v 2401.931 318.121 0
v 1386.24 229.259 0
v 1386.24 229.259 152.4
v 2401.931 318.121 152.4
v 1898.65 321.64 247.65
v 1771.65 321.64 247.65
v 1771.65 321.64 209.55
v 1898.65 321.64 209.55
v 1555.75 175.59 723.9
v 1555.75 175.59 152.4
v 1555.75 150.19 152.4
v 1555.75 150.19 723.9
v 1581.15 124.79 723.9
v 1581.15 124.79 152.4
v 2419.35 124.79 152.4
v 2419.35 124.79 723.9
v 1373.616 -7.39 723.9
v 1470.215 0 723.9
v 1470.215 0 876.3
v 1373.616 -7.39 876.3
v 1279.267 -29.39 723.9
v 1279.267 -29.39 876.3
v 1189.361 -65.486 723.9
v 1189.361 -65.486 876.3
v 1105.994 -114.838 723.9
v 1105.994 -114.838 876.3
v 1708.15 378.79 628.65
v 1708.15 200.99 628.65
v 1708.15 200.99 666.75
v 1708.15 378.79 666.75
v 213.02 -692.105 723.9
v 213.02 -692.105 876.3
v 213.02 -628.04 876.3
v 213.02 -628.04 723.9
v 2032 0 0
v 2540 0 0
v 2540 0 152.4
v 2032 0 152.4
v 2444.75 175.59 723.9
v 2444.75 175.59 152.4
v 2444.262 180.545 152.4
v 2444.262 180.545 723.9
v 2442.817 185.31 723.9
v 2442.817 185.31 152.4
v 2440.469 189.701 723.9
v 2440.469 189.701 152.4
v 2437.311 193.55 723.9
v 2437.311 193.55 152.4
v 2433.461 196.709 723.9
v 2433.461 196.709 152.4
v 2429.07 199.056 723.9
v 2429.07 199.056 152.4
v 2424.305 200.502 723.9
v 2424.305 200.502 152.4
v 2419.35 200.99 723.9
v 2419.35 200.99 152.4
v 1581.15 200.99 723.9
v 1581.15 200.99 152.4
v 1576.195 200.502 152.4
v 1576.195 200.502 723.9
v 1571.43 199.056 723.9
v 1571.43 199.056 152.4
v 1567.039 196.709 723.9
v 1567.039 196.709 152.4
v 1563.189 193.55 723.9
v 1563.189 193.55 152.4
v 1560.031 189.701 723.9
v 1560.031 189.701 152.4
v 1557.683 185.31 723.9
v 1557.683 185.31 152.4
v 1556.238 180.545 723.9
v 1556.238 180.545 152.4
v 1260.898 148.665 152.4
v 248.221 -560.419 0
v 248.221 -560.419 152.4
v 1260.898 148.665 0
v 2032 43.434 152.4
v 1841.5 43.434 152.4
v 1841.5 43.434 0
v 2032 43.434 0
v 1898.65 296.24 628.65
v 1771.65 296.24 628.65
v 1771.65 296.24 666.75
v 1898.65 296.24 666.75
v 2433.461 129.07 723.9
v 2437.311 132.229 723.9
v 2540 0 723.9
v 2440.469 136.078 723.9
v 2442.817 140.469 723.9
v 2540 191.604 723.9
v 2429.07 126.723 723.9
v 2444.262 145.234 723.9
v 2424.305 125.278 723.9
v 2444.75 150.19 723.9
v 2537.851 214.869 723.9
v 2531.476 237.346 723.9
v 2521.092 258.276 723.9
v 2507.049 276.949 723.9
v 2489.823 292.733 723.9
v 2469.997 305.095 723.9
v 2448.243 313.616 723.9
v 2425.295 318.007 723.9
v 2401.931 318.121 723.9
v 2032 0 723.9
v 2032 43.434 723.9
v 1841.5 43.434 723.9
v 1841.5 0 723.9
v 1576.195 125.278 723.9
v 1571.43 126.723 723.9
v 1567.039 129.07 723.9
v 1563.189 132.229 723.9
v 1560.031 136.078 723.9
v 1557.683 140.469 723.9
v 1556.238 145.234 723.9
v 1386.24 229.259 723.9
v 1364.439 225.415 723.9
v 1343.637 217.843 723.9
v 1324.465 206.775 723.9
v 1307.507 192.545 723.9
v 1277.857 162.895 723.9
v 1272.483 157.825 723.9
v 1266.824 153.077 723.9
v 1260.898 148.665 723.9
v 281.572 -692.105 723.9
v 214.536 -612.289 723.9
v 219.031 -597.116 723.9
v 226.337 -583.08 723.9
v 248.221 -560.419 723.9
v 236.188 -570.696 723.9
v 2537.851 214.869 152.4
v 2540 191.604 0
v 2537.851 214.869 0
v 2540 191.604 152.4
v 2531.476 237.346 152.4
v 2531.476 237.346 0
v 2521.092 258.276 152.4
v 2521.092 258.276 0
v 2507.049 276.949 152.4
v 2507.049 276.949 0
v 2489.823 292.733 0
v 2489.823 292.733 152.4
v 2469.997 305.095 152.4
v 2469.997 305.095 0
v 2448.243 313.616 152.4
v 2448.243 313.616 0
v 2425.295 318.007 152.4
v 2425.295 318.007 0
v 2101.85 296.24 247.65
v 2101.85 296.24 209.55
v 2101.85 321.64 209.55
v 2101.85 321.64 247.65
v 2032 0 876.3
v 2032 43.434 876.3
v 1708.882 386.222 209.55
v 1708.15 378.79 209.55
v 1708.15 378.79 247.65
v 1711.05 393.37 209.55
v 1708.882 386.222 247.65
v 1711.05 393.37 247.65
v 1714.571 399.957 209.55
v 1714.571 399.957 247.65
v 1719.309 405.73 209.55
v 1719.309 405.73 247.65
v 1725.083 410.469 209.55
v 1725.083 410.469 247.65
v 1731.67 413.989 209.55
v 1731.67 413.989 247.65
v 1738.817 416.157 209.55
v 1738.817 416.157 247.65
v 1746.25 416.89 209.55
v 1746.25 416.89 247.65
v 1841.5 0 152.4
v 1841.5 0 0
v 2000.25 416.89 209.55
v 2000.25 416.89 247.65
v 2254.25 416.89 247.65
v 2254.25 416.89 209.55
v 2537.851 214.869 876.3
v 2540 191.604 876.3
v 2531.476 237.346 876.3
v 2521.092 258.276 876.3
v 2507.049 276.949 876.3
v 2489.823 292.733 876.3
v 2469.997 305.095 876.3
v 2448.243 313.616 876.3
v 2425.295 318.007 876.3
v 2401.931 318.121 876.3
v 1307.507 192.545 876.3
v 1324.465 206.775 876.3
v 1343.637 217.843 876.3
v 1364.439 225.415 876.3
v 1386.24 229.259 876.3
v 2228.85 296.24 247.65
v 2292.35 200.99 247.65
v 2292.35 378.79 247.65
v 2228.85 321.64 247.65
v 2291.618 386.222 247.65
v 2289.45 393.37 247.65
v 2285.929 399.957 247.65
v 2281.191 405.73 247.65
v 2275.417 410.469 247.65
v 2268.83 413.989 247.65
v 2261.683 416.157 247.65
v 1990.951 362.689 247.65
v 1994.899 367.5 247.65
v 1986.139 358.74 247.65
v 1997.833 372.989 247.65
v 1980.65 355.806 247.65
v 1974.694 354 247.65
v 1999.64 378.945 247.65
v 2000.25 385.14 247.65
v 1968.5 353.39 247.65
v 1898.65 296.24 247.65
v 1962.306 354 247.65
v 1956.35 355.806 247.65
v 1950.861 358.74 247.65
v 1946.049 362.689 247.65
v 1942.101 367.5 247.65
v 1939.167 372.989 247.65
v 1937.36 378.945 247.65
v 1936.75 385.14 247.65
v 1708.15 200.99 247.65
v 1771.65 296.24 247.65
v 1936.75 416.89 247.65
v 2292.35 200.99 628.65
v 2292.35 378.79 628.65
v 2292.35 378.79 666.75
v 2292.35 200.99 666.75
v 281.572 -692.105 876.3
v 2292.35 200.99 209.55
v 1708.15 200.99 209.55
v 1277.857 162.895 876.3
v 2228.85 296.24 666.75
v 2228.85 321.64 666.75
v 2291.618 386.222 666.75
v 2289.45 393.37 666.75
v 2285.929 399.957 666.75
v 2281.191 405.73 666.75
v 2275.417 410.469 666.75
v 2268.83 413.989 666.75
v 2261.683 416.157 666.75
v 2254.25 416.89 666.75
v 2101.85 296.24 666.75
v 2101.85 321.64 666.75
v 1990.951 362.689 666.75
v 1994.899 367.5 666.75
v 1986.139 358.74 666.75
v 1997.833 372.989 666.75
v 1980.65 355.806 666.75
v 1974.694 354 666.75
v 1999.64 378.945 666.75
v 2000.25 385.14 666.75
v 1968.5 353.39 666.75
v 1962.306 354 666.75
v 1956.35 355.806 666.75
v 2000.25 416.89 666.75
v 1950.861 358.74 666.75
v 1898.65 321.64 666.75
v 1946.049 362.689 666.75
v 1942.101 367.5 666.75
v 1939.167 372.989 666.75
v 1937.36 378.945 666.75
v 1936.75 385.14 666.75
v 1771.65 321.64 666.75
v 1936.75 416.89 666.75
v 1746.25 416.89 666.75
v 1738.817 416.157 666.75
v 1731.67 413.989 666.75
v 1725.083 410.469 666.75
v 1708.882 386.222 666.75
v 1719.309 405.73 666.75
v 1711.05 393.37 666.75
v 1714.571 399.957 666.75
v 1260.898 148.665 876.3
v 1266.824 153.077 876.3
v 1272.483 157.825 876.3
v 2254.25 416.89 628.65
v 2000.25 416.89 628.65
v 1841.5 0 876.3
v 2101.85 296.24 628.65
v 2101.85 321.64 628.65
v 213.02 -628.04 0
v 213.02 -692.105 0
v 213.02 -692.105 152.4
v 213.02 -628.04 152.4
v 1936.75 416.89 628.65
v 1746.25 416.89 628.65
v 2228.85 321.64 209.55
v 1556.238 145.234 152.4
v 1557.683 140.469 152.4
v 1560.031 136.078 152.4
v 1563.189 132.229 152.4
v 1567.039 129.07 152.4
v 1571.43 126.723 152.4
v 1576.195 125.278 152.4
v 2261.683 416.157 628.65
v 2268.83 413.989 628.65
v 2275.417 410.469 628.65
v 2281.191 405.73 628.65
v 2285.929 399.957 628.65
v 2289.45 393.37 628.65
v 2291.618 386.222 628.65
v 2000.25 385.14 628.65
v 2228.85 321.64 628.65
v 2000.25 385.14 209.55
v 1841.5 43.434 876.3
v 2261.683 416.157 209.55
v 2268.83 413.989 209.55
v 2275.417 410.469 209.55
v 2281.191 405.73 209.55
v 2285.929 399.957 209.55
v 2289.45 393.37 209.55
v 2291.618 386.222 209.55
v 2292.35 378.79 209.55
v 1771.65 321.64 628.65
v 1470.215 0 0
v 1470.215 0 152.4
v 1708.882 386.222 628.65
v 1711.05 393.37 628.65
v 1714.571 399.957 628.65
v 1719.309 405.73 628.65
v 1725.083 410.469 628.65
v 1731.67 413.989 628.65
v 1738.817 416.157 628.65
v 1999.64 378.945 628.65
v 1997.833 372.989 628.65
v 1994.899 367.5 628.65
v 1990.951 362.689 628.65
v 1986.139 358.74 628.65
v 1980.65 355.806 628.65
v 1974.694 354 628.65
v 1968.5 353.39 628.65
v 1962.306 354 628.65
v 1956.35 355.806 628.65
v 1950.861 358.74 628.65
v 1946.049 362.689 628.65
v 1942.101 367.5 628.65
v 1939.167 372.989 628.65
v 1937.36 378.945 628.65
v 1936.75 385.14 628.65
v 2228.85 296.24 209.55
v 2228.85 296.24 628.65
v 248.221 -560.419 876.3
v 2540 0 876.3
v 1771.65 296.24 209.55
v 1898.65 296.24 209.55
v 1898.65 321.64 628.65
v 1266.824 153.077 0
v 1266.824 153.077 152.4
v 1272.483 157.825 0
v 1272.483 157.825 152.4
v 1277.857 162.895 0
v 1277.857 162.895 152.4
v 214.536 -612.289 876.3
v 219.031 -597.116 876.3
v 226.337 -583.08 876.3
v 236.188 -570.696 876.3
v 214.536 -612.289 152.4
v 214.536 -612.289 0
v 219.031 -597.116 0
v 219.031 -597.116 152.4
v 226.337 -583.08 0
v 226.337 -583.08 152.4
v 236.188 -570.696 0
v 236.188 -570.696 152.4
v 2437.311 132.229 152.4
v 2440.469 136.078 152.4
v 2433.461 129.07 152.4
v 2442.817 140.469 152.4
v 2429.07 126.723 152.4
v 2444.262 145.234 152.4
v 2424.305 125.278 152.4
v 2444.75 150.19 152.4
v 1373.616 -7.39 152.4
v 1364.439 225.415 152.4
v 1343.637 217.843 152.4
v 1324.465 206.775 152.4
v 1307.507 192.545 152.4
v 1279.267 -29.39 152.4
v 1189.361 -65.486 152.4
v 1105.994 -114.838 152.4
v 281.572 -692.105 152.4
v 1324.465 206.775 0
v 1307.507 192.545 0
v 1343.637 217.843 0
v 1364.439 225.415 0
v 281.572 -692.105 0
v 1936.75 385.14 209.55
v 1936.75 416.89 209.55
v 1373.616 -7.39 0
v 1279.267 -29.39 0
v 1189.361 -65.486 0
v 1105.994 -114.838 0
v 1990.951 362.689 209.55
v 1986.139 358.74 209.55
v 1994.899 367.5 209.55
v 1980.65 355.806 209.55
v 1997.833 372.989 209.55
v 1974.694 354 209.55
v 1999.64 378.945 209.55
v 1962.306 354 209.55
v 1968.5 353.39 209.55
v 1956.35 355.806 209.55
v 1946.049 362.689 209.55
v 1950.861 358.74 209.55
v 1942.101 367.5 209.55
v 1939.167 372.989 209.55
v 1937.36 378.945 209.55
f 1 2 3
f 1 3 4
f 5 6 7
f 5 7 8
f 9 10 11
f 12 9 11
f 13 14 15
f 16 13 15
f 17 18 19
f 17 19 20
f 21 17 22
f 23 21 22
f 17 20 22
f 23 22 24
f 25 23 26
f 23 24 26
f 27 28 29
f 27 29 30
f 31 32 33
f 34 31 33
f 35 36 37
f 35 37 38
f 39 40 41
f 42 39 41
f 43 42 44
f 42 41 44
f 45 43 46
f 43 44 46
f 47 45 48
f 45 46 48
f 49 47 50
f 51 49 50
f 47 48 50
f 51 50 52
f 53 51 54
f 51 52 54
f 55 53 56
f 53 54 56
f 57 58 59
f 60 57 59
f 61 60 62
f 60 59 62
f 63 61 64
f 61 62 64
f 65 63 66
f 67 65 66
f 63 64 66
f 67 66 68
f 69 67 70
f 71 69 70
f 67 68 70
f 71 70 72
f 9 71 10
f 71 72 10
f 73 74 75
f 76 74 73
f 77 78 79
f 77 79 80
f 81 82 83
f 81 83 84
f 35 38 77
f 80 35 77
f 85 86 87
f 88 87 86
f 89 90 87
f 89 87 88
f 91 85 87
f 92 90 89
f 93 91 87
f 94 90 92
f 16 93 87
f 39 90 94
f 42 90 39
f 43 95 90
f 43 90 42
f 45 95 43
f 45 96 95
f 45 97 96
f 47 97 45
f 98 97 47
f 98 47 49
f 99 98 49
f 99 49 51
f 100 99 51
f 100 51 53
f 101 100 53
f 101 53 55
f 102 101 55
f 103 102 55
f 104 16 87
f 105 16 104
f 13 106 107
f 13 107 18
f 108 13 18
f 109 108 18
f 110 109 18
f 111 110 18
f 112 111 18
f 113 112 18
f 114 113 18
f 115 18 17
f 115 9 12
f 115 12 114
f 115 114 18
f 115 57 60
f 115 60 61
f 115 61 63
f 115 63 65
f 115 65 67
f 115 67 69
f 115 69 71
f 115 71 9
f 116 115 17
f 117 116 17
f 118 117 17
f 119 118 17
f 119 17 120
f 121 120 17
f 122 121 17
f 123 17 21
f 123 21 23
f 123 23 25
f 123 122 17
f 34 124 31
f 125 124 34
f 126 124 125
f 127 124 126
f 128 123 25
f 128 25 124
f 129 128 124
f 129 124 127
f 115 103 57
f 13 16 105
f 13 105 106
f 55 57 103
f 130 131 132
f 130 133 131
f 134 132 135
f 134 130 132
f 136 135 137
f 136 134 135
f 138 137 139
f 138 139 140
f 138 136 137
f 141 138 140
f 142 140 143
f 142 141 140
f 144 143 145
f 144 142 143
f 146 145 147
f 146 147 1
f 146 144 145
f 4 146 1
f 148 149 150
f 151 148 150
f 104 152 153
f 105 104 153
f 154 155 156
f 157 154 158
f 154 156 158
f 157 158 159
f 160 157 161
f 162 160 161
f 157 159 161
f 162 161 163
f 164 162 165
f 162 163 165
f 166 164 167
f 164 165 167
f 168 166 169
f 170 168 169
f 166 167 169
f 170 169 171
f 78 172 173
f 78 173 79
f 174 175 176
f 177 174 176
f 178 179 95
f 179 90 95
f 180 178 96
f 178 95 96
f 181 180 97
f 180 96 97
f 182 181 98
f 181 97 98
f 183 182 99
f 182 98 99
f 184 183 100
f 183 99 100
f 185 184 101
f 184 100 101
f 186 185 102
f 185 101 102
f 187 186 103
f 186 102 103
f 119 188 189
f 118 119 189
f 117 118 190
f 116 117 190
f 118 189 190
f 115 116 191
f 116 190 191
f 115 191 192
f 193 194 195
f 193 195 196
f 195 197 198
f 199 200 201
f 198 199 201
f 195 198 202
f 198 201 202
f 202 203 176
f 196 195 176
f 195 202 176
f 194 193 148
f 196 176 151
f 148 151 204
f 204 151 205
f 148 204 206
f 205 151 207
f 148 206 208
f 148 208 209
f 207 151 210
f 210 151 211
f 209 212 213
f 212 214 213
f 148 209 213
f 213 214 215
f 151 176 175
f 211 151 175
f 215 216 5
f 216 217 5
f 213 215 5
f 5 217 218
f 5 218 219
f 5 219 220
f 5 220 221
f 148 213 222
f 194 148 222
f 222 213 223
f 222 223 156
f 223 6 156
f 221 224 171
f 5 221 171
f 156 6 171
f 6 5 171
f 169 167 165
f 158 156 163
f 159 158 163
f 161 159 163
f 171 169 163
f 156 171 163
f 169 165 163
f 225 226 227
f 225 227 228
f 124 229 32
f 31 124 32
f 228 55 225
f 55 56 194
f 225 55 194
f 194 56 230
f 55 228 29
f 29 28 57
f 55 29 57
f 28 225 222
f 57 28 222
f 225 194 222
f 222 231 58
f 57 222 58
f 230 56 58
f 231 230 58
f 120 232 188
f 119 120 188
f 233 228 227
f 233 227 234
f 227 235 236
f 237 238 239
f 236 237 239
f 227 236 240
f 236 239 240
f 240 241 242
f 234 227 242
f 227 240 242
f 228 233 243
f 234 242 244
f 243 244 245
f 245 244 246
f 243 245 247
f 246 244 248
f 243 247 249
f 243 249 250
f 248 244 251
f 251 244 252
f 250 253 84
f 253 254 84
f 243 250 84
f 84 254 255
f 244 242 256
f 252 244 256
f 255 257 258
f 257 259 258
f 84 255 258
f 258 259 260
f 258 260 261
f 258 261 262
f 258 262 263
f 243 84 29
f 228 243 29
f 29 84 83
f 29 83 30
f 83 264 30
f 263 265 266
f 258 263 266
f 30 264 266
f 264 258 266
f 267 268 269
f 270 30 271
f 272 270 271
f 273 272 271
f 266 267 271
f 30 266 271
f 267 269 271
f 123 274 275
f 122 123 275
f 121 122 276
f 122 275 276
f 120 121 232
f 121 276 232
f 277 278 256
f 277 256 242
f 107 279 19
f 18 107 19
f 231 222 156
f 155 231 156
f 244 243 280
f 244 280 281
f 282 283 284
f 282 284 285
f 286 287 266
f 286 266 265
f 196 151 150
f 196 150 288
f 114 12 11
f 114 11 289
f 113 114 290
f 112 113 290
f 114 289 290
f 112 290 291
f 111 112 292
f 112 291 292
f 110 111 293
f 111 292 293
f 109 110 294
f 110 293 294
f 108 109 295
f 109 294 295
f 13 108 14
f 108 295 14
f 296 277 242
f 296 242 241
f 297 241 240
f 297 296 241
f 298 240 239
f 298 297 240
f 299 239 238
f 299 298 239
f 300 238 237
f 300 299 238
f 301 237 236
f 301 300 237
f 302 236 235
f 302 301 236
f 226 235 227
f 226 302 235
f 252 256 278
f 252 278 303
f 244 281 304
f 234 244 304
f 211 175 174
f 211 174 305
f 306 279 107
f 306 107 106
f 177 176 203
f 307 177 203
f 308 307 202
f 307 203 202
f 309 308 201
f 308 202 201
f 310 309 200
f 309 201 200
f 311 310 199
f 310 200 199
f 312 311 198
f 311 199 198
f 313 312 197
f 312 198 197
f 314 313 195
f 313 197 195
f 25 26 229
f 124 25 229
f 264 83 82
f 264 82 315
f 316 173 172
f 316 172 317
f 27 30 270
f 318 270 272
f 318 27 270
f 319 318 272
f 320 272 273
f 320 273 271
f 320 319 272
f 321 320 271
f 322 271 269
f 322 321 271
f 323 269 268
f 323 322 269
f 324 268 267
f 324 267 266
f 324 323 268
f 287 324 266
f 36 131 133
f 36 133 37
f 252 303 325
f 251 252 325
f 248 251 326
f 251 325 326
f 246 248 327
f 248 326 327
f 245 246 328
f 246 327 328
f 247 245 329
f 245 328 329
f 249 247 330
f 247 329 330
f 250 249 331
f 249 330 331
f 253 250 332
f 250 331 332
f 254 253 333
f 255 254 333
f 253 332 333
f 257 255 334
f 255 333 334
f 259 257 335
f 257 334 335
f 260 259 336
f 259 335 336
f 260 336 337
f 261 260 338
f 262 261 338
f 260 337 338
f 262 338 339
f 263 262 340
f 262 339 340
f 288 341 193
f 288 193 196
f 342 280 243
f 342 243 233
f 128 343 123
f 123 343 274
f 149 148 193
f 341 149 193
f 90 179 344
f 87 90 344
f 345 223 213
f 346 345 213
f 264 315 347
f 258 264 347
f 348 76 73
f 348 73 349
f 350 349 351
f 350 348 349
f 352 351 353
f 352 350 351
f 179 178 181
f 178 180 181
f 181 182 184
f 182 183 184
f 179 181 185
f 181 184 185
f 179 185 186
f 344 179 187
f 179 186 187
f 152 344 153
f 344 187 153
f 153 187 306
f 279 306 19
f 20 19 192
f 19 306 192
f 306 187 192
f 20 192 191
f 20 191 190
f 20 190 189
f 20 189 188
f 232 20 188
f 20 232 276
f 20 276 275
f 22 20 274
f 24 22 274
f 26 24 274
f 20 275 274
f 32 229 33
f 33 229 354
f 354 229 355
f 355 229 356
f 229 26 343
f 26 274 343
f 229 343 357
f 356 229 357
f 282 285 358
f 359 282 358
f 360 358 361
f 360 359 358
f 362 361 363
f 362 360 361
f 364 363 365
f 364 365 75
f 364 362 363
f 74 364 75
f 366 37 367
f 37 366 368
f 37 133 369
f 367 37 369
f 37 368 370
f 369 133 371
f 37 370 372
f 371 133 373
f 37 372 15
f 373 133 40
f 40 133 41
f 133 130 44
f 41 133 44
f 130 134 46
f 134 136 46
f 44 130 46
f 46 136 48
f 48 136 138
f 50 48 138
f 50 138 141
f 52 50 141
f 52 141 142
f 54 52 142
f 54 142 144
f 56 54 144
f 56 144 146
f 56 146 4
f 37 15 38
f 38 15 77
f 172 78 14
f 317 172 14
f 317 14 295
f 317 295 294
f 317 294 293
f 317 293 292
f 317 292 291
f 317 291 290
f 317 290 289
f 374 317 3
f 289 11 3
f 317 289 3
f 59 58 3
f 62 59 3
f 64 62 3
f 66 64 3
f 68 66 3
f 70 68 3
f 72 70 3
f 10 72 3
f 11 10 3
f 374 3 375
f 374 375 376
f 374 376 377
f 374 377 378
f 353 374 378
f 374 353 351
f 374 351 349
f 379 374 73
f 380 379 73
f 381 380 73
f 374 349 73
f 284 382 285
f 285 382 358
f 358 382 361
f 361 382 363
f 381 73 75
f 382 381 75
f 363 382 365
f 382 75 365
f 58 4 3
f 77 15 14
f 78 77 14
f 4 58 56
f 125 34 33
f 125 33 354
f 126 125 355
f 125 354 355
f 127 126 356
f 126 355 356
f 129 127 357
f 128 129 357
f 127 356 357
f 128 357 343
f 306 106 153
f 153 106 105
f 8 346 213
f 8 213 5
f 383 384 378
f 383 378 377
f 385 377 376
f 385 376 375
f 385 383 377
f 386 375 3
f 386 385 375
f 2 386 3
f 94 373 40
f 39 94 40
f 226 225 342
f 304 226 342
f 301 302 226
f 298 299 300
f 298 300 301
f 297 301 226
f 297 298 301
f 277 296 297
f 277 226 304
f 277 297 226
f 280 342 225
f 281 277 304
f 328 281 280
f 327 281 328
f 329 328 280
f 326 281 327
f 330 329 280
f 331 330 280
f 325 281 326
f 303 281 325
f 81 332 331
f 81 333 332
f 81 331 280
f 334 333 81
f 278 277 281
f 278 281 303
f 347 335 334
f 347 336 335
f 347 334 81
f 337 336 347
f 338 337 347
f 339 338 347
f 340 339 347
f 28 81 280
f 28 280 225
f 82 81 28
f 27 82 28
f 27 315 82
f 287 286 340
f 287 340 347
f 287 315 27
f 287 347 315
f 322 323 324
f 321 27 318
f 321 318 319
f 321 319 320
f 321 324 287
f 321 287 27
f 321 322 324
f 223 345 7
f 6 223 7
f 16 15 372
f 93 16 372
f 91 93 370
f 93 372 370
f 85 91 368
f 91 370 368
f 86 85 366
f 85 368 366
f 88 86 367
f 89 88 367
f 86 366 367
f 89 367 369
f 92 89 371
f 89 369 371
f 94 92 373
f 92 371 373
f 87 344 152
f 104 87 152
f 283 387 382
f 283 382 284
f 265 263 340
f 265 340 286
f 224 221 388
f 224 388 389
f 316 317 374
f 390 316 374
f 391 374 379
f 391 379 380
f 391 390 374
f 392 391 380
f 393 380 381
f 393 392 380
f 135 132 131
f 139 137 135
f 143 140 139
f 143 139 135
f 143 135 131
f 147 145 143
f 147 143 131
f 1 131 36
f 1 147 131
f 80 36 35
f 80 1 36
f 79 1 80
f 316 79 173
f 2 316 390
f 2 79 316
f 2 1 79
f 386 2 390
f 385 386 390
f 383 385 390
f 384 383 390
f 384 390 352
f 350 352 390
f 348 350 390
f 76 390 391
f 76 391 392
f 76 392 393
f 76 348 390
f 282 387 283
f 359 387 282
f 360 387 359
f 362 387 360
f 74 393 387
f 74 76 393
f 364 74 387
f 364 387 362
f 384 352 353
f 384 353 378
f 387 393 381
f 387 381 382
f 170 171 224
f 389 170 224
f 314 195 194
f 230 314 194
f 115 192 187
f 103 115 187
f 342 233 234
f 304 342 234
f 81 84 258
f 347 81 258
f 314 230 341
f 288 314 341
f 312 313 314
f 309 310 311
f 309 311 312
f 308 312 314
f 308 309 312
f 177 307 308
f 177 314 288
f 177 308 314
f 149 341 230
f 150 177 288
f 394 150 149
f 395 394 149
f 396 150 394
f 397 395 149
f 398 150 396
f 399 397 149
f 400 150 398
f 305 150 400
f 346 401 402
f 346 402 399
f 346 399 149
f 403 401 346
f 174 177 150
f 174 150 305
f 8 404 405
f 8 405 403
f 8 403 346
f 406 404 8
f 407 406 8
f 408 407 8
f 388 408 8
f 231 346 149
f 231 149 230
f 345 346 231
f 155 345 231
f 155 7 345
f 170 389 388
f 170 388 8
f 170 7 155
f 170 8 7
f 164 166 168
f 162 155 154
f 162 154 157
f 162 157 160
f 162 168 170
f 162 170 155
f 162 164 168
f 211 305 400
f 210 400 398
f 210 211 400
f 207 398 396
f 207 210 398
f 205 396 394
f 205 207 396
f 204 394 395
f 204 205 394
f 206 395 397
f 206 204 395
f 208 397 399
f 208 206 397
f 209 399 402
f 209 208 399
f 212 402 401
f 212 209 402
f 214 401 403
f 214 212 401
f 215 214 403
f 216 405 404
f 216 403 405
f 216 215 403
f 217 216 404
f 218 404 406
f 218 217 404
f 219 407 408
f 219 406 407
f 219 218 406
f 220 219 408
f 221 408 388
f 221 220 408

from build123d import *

# Parameters (mm, degrees)
BOSS_EXTRUDE1_DEPTH  = 152.4
SKETCH2_W            = 190.5
SKETCH2_H            = 190.5
CUT_EXTRUDE1_DEPTH   = 254
BOSS_EXTRUDE2_DEPTH  = 571.5
FILLET1_R            = 127
FILLET1_OF_MIRROR1_R = 127
SKETCH8_W            = 127
SKETCH8_H            = 25.4
BOSS_EXTRUDE3_DEPTH  = 38.1
CUT_EXTRUDE2_DEPTH   = 43.18


with BuildPart() as part:
    # Sketch1 → Boss-Extrude1 (new body)
    with BuildSketch(Plane.XY):
        with BuildLine():
            Line((213.019747539, -692.104923164), (213.019747539, -628.039977762))
            ThreePointArc((213.019747539, -628.039977762), (222.347003261, -589.92262974), (248.221012719, -560.418976506))
            Line((248.221012719, -560.418976506), (1260.898352267, 148.66533042))
            ThreePointArc((1260.898352267, 148.66533042), (1269.688171281, 155.409995769), (1277.856706062, 162.895078834))
            Line((1277.856706062, 162.895078834), (1307.506572341, 192.544945114))
            ThreePointArc((1307.506572341, 192.544945114), (1343.636614311, 217.843472857), (1386.240354223, 229.259110561))
            Line((1386.240354223, 229.259110561), (2540, 330.2))
            Line((2540, 330.2), (2540, 0))
            Line((2540, 0), (1470.214730938, 0))
            ThreePointArc((1470.214730938, 0), (1279.266548253, -29.389736275), (1105.993693855, -114.838451876))
            Line((1105.993693855, -114.838451876), (281.571733527, -692.104923164))
            Line((281.571733527, -692.104923164), (213.019747539, -692.104923164))
        make_face()
    boss_extrude1 = extrude(amount=BOSS_EXTRUDE1_DEPTH)

    # Sketch2 → Cut-Extrude1 (cut)
    with BuildSketch(Plane.XY.offset(152.4)):
        with Locations((1936.75, -51.816)):
            Rectangle(SKETCH2_W, SKETCH2_H)
    cut_extrude1 = extrude(amount=-CUT_EXTRUDE1_DEPTH, mode=Mode.SUBTRACT)

    # Sketch4 → Boss-Extrude2 (add)
    with BuildSketch(Plane.XY.offset(152.4)):
        with BuildLine():
            Line((1581.15, 124.78955528), (2419.35, 124.78955528))
            ThreePointArc((2419.35, 124.78955528), (2437.310512242, 132.229043038), (2444.75, 150.18955528))
            Line((2444.75, 150.18955528), (2444.75, 175.58955528))
            ThreePointArc((2444.75, 175.58955528), (2437.310512242, 193.550067523), (2419.35, 200.98955528))
            Line((2419.35, 200.98955528), (1581.15, 200.98955528))
            ThreePointArc((1581.15, 200.98955528), (1563.189487758, 193.550067523), (1555.75, 175.58955528))
            Line((1555.75, 175.58955528), (1555.75, 150.18955528))
            ThreePointArc((1555.75, 150.18955528), (1563.189487758, 132.229043038), (1581.15, 124.78955528))
        make_face()
    extrude(amount=BOSS_EXTRUDE2_DEPTH)

    # Fillet1
    fillet1_edges = [part.edges().sort_by_distance(p)[0] for p in [
        (2540, 330.2, 76.2),
    ]]
    fillet(fillet1_edges, radius=FILLET1_R)

    # Mirror1: Boss-Extrude1, Cut-Extrude1 across plane
    add(boss_extrude1.mirror(Plane.XY.offset(438.15)))
    add(cut_extrude1.mirror(Plane.XY.offset(438.15)), mode=Mode.SUBTRACT)

    # Fillet1 of Mirror1
    fillet1_of_mirror1_edges = [part.edges().sort_by_distance(p)[0] for p in [
        (2540, 330.2, 800.1),
    ]]
    fillet(fillet1_of_mirror1_edges, radius=FILLET1_OF_MIRROR1_R)

    # Sketch8 → Boss-Extrude3 (add)
    with BuildSketch(Plane.XY.offset(247.65)):
        with BuildLine():
            Line((1708.15, 200.98955528), (1708.15, 378.78955528))
            ThreePointArc((1708.15, 378.78955528), (1719.309231637, 405.730323644), (1746.25, 416.88955528))
            Line((1746.25, 416.88955528), (2254.25, 416.88955528))
            ThreePointArc((2254.25, 416.88955528), (2281.190768363, 405.730323644), (2292.35, 378.78955528))
            Line((2292.35, 378.78955528), (2292.35, 200.98955528))
            Line((2292.35, 200.98955528), (1708.15, 200.98955528))
        make_face()
        with Locations((1835.15, 308.93955528)):
            Rectangle(SKETCH8_W, SKETCH8_H, mode=Mode.SUBTRACT)
        with Locations((2165.35, 308.93955528)):
            Rectangle(SKETCH8_W, SKETCH8_H, mode=Mode.SUBTRACT)
    boss_extrude3 = extrude(amount=-BOSS_EXTRUDE3_DEPTH)

    # Sketch9 → Cut-Extrude2 (cut)
    with BuildSketch(Plane.XY.offset(247.65)):
        with BuildLine():
            Line((1936.75, 385.13955528), (1936.75, 416.88955528))
            Line((1936.75, 416.88955528), (2000.25, 416.88955528))
            Line((2000.25, 416.88955528), (2000.25, 385.13955528))
            ThreePointArc((2000.25, 385.13955528), (1968.5, 353.38955528), (1936.75, 385.13955528))
        make_face()
    cut_extrude2 = extrude(amount=-CUT_EXTRUDE2_DEPTH, mode=Mode.SUBTRACT)

    # Mirror2: Boss-Extrude3, Cut-Extrude2 across plane
    add(boss_extrude3.mirror(Plane.XY.offset(438.15)))
    add(cut_extrude2.mirror(Plane.XY.offset(438.15)), mode=Mode.SUBTRACT)


solid = part.part
